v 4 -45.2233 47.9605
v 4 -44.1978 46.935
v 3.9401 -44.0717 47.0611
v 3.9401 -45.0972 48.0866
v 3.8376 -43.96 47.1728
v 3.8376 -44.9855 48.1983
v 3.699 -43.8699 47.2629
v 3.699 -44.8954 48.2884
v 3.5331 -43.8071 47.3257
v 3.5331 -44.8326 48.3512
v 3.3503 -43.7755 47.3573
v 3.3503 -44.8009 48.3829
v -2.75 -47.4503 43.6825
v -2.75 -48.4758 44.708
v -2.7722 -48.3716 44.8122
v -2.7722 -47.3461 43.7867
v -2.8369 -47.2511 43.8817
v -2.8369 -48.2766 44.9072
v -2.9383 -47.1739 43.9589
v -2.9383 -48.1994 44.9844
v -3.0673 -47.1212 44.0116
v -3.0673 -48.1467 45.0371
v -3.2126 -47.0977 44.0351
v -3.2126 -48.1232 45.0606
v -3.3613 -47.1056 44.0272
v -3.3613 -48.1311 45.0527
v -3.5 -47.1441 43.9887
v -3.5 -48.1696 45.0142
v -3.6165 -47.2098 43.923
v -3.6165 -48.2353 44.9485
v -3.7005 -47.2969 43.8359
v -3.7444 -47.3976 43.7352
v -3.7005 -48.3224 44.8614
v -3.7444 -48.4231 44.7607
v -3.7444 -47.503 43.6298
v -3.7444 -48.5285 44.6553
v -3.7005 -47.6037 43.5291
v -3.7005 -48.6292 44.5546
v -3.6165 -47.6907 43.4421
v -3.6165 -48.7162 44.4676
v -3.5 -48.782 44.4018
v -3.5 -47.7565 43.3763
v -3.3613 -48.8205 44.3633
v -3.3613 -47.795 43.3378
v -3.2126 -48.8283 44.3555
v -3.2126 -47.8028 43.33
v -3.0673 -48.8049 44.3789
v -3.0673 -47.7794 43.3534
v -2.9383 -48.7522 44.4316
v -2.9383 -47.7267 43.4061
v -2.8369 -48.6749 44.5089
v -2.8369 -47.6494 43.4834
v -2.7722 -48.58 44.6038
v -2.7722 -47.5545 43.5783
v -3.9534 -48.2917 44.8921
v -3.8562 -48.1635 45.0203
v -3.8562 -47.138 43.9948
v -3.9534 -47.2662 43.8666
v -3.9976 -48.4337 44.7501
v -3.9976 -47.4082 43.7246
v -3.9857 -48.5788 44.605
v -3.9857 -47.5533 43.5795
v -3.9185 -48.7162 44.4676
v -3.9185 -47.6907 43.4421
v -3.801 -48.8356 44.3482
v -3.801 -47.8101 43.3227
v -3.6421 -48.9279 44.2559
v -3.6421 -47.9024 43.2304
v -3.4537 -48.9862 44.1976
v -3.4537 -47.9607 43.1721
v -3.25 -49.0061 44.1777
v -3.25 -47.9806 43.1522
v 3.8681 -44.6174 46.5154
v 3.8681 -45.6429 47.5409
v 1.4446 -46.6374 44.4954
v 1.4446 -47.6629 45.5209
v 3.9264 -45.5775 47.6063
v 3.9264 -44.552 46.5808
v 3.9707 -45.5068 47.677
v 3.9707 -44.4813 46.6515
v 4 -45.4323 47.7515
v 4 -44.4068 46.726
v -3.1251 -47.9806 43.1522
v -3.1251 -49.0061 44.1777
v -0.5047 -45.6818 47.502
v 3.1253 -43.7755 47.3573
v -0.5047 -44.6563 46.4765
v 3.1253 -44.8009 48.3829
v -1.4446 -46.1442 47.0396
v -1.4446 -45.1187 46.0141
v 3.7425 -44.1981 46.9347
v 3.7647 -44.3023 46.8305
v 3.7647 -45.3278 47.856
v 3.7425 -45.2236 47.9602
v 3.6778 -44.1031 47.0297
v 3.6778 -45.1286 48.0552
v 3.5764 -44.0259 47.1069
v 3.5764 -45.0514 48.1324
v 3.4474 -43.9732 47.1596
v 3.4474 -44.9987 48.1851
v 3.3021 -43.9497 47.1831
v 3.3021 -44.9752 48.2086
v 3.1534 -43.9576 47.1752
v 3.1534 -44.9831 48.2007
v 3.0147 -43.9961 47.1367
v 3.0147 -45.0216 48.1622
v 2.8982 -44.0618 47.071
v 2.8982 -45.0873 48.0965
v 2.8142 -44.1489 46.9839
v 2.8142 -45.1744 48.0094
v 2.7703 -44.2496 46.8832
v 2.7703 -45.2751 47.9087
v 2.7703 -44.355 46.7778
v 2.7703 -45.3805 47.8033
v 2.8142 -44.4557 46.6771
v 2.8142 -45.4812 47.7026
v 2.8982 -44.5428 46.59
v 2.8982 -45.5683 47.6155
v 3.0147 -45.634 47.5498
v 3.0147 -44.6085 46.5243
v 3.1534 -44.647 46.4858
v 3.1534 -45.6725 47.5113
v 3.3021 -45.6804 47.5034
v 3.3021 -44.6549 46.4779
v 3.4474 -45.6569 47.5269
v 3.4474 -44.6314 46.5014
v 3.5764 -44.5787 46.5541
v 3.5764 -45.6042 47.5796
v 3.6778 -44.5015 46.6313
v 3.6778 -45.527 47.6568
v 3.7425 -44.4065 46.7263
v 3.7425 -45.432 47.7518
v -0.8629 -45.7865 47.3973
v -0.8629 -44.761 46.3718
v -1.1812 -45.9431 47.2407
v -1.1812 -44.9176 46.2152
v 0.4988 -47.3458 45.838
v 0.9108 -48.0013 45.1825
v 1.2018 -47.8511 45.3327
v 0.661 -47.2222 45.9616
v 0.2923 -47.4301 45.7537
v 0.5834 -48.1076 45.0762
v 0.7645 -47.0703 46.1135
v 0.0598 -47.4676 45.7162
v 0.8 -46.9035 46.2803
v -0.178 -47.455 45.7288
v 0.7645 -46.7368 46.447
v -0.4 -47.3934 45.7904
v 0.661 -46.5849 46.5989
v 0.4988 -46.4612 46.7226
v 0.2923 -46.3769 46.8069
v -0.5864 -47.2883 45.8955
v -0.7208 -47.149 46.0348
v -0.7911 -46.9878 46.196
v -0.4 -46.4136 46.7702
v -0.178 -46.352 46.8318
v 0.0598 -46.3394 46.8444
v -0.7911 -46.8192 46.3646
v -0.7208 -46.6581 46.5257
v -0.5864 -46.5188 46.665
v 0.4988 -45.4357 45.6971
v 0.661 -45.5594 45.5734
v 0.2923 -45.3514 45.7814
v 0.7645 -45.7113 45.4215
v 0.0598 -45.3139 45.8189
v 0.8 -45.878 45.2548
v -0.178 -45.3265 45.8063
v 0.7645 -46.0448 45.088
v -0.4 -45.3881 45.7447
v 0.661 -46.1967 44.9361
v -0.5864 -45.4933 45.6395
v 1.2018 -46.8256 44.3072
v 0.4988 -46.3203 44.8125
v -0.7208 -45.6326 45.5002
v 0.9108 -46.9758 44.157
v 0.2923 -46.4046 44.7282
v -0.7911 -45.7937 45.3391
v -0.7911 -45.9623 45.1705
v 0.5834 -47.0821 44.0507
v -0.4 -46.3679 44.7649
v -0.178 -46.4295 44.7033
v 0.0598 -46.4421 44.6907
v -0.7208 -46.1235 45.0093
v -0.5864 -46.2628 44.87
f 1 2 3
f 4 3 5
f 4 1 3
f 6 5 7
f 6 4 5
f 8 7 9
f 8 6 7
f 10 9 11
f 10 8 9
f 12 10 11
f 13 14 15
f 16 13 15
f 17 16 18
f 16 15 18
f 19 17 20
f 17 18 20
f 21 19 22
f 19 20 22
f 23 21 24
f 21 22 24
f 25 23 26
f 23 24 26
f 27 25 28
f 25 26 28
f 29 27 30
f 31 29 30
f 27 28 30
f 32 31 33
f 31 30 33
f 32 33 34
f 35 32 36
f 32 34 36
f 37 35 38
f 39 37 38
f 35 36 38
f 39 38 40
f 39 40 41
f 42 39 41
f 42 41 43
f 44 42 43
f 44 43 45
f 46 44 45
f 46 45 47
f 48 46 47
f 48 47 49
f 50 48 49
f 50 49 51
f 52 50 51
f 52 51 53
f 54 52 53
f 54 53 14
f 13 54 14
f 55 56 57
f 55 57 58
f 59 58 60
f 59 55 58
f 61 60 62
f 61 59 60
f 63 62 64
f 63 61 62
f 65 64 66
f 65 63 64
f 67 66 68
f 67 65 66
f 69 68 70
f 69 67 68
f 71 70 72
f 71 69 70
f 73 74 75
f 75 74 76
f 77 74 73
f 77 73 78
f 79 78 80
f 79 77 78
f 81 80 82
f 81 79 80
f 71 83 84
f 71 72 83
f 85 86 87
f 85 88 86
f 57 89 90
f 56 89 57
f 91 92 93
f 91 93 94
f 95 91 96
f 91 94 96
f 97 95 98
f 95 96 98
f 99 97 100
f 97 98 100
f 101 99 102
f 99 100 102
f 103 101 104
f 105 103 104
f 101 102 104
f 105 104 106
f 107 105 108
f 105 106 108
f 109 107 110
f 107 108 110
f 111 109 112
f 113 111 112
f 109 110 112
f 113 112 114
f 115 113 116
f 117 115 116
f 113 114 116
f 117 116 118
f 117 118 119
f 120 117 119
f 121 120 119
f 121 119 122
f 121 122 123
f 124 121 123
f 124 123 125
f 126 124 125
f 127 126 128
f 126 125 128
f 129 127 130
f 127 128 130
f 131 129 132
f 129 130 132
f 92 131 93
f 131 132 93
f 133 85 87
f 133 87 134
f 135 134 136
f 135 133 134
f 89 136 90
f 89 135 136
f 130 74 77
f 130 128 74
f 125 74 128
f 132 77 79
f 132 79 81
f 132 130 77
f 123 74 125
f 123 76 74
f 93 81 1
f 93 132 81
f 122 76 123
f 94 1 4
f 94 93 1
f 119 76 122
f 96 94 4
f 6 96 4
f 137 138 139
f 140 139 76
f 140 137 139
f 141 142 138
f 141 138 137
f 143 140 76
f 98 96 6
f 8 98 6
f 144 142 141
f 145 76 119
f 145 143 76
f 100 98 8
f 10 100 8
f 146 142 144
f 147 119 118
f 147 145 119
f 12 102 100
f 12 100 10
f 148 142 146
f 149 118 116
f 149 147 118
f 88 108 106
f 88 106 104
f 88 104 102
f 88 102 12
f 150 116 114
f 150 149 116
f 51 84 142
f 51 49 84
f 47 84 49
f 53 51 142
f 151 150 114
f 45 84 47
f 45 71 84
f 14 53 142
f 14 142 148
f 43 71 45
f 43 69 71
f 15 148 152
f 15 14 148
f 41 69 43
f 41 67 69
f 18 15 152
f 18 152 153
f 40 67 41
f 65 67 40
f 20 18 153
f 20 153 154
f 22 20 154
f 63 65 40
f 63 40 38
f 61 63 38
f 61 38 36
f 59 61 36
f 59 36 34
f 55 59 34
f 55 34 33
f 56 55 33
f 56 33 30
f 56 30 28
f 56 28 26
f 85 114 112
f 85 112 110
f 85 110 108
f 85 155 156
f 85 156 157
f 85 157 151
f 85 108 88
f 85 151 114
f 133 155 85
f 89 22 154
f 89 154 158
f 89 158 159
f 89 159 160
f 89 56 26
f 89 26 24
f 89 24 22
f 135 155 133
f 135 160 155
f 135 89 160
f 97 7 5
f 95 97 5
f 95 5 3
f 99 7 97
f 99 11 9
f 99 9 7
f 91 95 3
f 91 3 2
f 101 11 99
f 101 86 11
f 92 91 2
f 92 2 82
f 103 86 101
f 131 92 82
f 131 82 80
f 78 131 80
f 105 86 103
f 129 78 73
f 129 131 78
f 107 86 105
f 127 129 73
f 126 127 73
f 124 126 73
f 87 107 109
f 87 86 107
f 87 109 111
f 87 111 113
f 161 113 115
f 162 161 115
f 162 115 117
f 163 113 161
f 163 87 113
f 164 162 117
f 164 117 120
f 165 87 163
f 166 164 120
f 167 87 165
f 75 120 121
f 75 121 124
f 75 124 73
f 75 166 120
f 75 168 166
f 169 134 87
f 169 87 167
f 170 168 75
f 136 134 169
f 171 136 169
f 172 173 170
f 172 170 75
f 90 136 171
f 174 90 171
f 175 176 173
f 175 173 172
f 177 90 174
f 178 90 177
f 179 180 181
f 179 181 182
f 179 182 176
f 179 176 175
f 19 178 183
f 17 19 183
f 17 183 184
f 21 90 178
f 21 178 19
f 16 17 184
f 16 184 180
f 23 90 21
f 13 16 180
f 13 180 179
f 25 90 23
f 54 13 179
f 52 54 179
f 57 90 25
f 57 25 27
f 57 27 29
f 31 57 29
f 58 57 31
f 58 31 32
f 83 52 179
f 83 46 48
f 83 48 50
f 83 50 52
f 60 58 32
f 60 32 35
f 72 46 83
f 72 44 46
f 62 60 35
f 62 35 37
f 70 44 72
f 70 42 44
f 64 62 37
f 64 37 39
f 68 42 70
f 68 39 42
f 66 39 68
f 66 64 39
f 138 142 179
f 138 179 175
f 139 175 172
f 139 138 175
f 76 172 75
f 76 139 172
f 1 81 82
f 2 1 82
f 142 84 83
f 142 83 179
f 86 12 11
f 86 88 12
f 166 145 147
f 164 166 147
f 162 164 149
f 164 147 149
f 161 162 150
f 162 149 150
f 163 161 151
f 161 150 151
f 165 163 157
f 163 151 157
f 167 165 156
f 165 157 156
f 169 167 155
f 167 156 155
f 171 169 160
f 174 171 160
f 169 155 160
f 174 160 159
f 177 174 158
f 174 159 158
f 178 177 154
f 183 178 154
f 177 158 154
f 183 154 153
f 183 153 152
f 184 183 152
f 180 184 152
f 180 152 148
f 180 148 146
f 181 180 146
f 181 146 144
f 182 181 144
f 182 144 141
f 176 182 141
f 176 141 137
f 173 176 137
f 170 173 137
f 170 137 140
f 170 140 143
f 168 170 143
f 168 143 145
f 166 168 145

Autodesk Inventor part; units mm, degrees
ref_plane "YZ Plane" through (0, 0, 0) normal (1, 0, 0) x (0, 1, 0)
ref_plane "XZ Plane" through (0, 0, 0) normal (0, 1, 0) x (-1, 0, 0)
ref_plane "XY Plane" through (0, 0, 0) normal (0, 0, 1) x (1, 0, 0)
sketch "Sketch1" plane through (0, 0, 0) normal (1, 0, 0) x (0, 1, 0)
  circle A0 centre (-9.1612, 46.1081) radius 0.5 construction
  circle A1 centre (-9.1612, 46.1081) radius 0.9 construction
  line L0 (0, 43.0329) -> (-28.9151, 45.5627) construction
  line L1 (1.0918, 43.1767) -> (-27.4928, 38.1364) construction
  line L2 (-1.0918, 51.3262) -> (-28.367, 41.3989) construction
  line L3 (0, 51.4699) -> (-28.9151, 48.9402) construction
  line L4 (17.609, 51.9698) -> (-38.9081, 36.826) construction
  line L5 (18.2302, 47.2514) -> (-40.2807, 47.2514) construction
  line L6 (-2.4562, 42.2517) -> (-3.9425, 12.3724) construction
  line L7 (-19.1091, 33.3894) -> (19.1091, 33.3894) construction
  line L8 (-15.9499, 49.3393) -> (15.9499, 17.4395) construction
  line L9 (-15.9953, 17.3941) -> (15.9953, 49.3847) construction
  line L10 (2.4672, 42.2517) -> (3.9506, 12.3724) construction
  line L11 (-4.2099, 47.2514) -> (-6.25, 6.2414) construction
  line L12 (4.2215, 47.2514) -> (6.2448, 6.4952) construction
  circle A2 centre (-12.7187, 42.5506) radius 0.9 construction
  line L13 (-11.8457, 45.2351) -> (-10.9619, 46.119) construction
  line L14 (-10.9619, 46.119) -> (-9.1941, 44.3513) construction
  line L15 (-12.7296, 44.3513) -> (-13.501, 42.9956) construction
  line L16 (-11.8457, 45.2351) -> (-12.7296, 44.3513) construction
  line L17 (-10.9619, 42.5835) -> (-12.2433, 41.7864) construction
  line L18 (-12.7296, 44.3513) -> (-10.9619, 42.5835) construction
  line L19 (-10.9619, 46.119) -> (-9.6062, 46.8904) construction
  line L20 (-9.1941, 44.3513) -> (-10.078, 43.4674) construction
  line L21 (-10.9619, 42.5835) -> (-10.078, 43.4674) construction
  circle A3 centre (-12.7187, 42.5506) radius 0.5 construction
  line L22 (-13.4028, 41.8664) -> (-9.1612, 46.1081) construction
  line L23 (-9.1941, 44.3513) -> (-8.3969, 45.6327) construction
  line L24 (0.0006, 41.0008) -> (0, 41.0008) construction
  line L25 (0.0006, 41.0001) -> (0, 41.0001) construction
  line L26 (-2.4567, 42.2414) -> (2.4677, 42.2414) construction
  line L27 (2.4672, 42.2517) -> (-2.4562, 42.2517) construction
  line L28 (3, 47.2514) -> (4.2185, 47.2514) construction
  line L29 (0, 48.3894) -> (0, 48.3894) construction
  line L30 (-4.2185, 47.2514) -> (-4.2099, 47.2514) construction
  line L31 (0, 51.4699) -> (0, 43.0329) construction
  line L32 (-1.0918, 51.3262) -> (1.0918, 43.1767) construction
  ellipse E0 centre (0, 47.2514) end of major axis (-3, 47.2514) minor radius 3 (0.0225, 44.2515) -> (-0.0225, 44.2515) ccw construction
  circle A4 centre (0, 47.2514) radius 3 construction
  ellipse E1 centre (0, 47.2514) end of major axis (4.2185, 47.2514) minor radius 4.2127 (4.2185, 47.2514) -> (-4.2185, 47.2514) ccw construction
  circle A5 centre (0, 47.2514) radius 4.2185 construction
  line L33 (-6.0016, 11.2344) -> (6.0096, 11.2344) construction
  line L34 (-3.9425, 12.3724) -> (3.9506, 12.3724) construction
  ellipse E2 centre (0, 6.2414) end of major axis (-5, 6.2414) minor radius 5 construction
  ellipse E3 centre (0, 6.2414) end of major axis (6.25, 6.2414) minor radius 6.2414 (-6.2423, 6.5518) -> (6.2393, 6.6057) ccw construction
  line L35 (-28.1887, 40.7336) -> (-33.0183, 39.4395) construction
  line L36 (-34.1303, 30.7554) -> (-31, 33.8856) construction
  line L37 (-42.8892, 48.6033) -> (-22.6298, 28.3438) construction
  circle A6 centre (-31.7936, 38.7324) radius 0.2 construction
  circle A7 centre (-33.0183, 39.4395) radius 0.2 construction
  circle A8 centre (-32.7595, 38.4736) radius 0.6398 construction
  circle A9 centre (-32.7595, 38.4736) radius 0.6398 construction
  line L38 (-33.6434, 39.3574) -> (-31.8756, 37.5897) construction
  line L39 (-33.6434, 39.3574) -> (-31.5728, 39.3574) construction
  line L40 (-27.4928, 38.1364) -> (-28.367, 41.3989) construction
  line L41 (-28.9151, 45.5627) -> (-28.9151, 48.9402) construction
  line L42 (-34.0028, 47.2514) -> (-25.2783, 38.5269) construction
  line L43 (-28.1887, 40.7336) -> (-22.3931, 42.2865) construction
  line L44 (-21.5614, 39.1823) -> (-22.7073, 43.4588) construction
  line L45 (-27.6711, 38.8017) -> (-21.8755, 40.3546) construction
  line L46 (-32.5007, 37.5076) -> (-27.6711, 38.8017) construction
  line L47 (-42.7094, 48.4234) -> (-41.2248, 46.9389) construction
  line L48 (-33.0183, 39.4395) -> (-32.5007, 37.5076) construction
  circle A10 centre (-32.5007, 37.5076) radius 0.2 construction
  circle A11 centre (-32.7595, 38.4736) radius 1.01 construction
  circle A12 centre (-33.7254, 38.2147) radius 0.2 construction
  circle A13 centre (-32.7595, 38.4736) radius 1.25 construction
  line L49 (-31.8756, 37.5897) -> (-33.2898, 36.1755) construction
  line L50 (-31.8756, 37.5897) -> (-32.9109, 35.7965) construction
  line L51 (-35.0576, 37.9432) -> (-33.6434, 39.3574) construction
  line L52 (-32.9109, 35.7965) -> (-33.8666, 34.8408) construction
  line L53 (-33.2898, 36.1755) -> (-35.0576, 37.9432) construction
  line L54 (-35.4365, 38.3222) -> (-32.9109, 35.7965) construction
  line L55 (-36.3923, 37.3664) -> (-35.4365, 38.3222) construction
  line L56 (-33.8666, 34.8408) -> (-36.3923, 37.3664) construction
  line L57 (-31, 33.8856) -> (-41.6066, 44.4922) construction
  line L58 (-44.7369, 41.362) -> (-34.1303, 30.7554) construction
  line L59 (-43.1717, 42.9271) -> (-32.5651, 32.3205) construction
  line L60 (-33.6434, 39.3574) -> (-35.4365, 38.3222) construction
  circle A14 centre (-46.5116, 43.1367) radius 1.0497 construction
  line L61 (-47.1835, 40.9802) -> (-44.2042, 43.9595) construction
  line L62 (-46.1769, 46.993) -> (-47.2764, 45.8935) construction
  line L63 (-43.7409, 42.358) -> (-42.6414, 43.4574) construction
  line L64 (-43.1717, 42.9271) -> (-45.2366, 44.992) construction
  line L65 (-47.2764, 45.8935) -> (-43.7409, 42.358) construction
  line L66 (-45.8947, 42.269) -> (-42.5137, 45.6501) construction
  line L67 (-41.6066, 44.4922) -> (-44.7369, 41.362) construction
  line L68 (-48.6681, 42.4647) -> (-42.7094, 48.4234) construction
  line L69 (-41.9671, 47.6812) -> (-47.9258, 41.7225) construction
  line L70 (-41.2248, 46.9389) -> (-47.1835, 40.9802) construction
  line L71 (-42.6414, 43.4574) -> (-46.1769, 46.993) construction
  line L72 (-44.1236, 47.0092) -> (-42.6391, 45.5247) construction
  line L73 (-41.2248, 46.9389) -> (-44.2042, 43.9595) construction
  circle A15 centre (-43.3813, 46.2669) radius 1.0497 construction
  line L74 (-47.1835, 40.9802) -> (-48.6681, 42.4647) construction
  line L75 (-47.2538, 43.8789) -> (-45.7693, 42.3944) construction
  circle A16 centre (-43.3813, 46.2669) radius 1.0497 construction
  circle A17 centre (-46.5116, 43.1367) radius 1.05 construction
  circle A18 centre (-43.3813, 46.2669) radius 1.3 construction
  circle A19 centre (-46.5116, 43.1367) radius 1.3 construction
  line L76 (-41.9671, 47.6812) -> (-47.9258, 41.7225) construction
  line L77 (-47.9258, 41.7225) -> (-49.6936, 43.4902) construction
  line L78 (-49.6936, 43.4902) -> (-43.7349, 49.4489) construction
  line L79 (-43.7349, 49.4489) -> (-41.9671, 47.6812) construction
  line L80 (-41.9671, 47.6812) -> (-42.0968, 46.0669) construction
  line L81 (-47.9258, 41.7225) -> (-46.3116, 41.8522) construction
  line L82 (-44.9465, 44.7018) -> (-45.2271, 42.9367) construction
  line L83 (-44.9465, 44.7018) -> (-43.1813, 44.9824) construction
  line L84 (-44.801, 45.617) -> (-44.0639, 44.8421) construction
  line L85 (-44.0639, 44.8421) -> (-45.1697, 43.7902) construction
  line L86 (-45.1697, 43.7902) -> (-45.9068, 44.5651) construction
  line L87 (-45.9068, 44.5651) -> (-44.801, 45.617) construction
  line L88 (-44.801, 48.3828) -> (-49.0061, 44.1777) construction
  line L89 (-49.0061, 44.1777) -> (-52.5417, 47.7132) construction
  line L90 (-52.5417, 47.7132) -> (-48.3365, 51.9184) construction
  line L91 (-48.3365, 51.9184) -> (-44.801, 48.3828) construction
  line L92 (-46.9035, 50.4854) -> (-51.1087, 46.2803) construction
  line L93 (-44.801, 48.3828) -> (-43.7755, 47.3573)
  line L94 (-43.7755, 47.3573) -> (-47.9806, 43.1522)
  line L95 (-47.9806, 43.1522) -> (-49.0061, 44.1777)
  line L96 (-49.0061, 44.1777) -> (-44.801, 48.3828)
  line L97 (-46.1769, 46.993) -> (-45.1584, 45.9744)
  line L98 (-45.1584, 45.9744) -> (-46.2578, 44.875)
  line L99 (-46.2578, 44.875) -> (-47.2764, 45.8935)
  line L100 (-47.2764, 45.8935) -> (-46.1769, 46.993)
  point P0 (0, 0)
  point P1 (0, 0)
  point P2 (0, 33.3894)
  point P3 (-6.009, 41)
  point P4 (0, 47.2514)
  point P5 (0, 47.2514)
  point P6 (0, 0)
  point P7 (0, 0)
  point P8 (0, 12.3724)
  point P9 (0, 0)
  point P10 (28.7519, 36.3712)
  point P11 (-45.0774, 43.878)
  dimension "d12" = 3
  dimension "d13" = 5
  dimension "d14" = 6.2414
  dimension "d4" = 41.01
  dimension "d5" = 6.2414
  dimension "d6" = 4.993
  dimension "d7" = 5.69
  dimension "d8" = 29.869
  dimension "d9" = 1.138
  dimension "d10" = 2
  dimension "d11" = 90
  dimension "d15" = 15
  dimension "d16" = 2.5
  dimension "d17" = 1.25
  dimension "d18" = 60
  dimension "d19" = 2
  dimension "d20" = 1
  dimension "d21" = 6
  dimension "d22" = 1
  dimension "d23" = 1.8
  dimension "d24" = 5
  dimension "d25" = 2
  dimension "d26" = 2.02
  dimension "d27" = 2.5
  dimension "d28" = 0.4
  dimension "d29" = 360
  dimension "d30" = 150
  dimension "d31" = 15
  dimension "d32" = 15
  dimension "d33" = 5
  dimension "d34" = 0.75
  dimension "d35" = 4.2134
  dimension "d36" = 2
  dimension "d37" = 2.1
  dimension "d38" = 2.6
  dimension "d39" = 2.6
  dimension "d40" = 2.5
  dimension "d41" = 5
  dimension "d42" = 5.947
extrude "Extrusion1" add sketch "Sketch1" along normal mid plane 8
sketch "Sketch2" plane through (-4, -49.0061, 44.1777) normal (0, -0.7071068, 0.7071068) x (1, 0, 0)
  line L0 (0, 0) -> (8, 0) projected
  line L1 (8, 5.947) -> (8, 0) projected
  line L2 (8, 5.947) -> (0, 5.947) projected
  line L3 (0, 0) -> (0, 5.947) projected
  line L4 (0, 0) -> (8, 5.947)
  line L5 (0, 5.947) -> (0, 0) projected
  line L6 (0, 5.947) -> (8, 0)
  line L7 (0, 5.947) -> (8, 5.947) projected
  line L8 (4, 5.947) -> (4, -0.1076) construction
  line L9 (0, 2.9735) -> (8, 3) construction
  circle A0 centre (0.75, 0.75) radius 0.75
  circle A1 centre (4, 2.9735) radius 1.8
  line L10 (0.1438, 1.1916) -> (0.9981, 0.0422)
  circle A2 centre (0.7353, 5.2019) radius 0.75
  line L11 (0.1319, 4.7563) -> (0.9787, 5.9113)
  circle A3 centre (7.25, 0.75) radius 0.75
  line L12 (7.8562, 1.1916) -> (7.0019, 0.0422)
  line L13 (7.8681, 4.7563) -> (7.0213, 5.9113)
  circle A4 centre (7.2647, 5.2019) radius 0.75
  line L14 (2.6994, 4.2179) -> (0.1438, 1.1916)
  line L15 (0.8749, 0) -> (4.5834, 1.2707)
  line L16 (7.1253, 5.947) -> (3.4953, 4.7013)
  line L17 (7.8681, 4.7563) -> (5.295, 1.7233)
  line L18 (0, 5.947) -> (8, 5.947)
  line L19 (8, 5.947) -> (8, 0)
  line L20 (8, 0) -> (0, 0)
  line L21 (0, 0) -> (0, 5.947)
  circle A5 centre (4, 2.9735) radius 0.8
  circle A6 centre (0.75, 0.75) radius 0.5
  circle A7 centre (7.2647, 5.2019) radius 0.5
  point P0 (4, 3.4142)
  point P1 (8, 5.3499)
  point P2 (7.3505, 5.947)
  point P3 (8, 5.0539)
  point P4 (7.8027, 4.6793)
  point P5 (5.4446, 1.8996)
  point P6 (0, 0.75)
  point P7 (0.2132, 1.2737)
  point P8 (2.5554, 4.0474)
  point P9 (7.1253, 5.947)
  point P10 (0.75, 0)
  point P11 (4, 3)
  dimension "d45" = 1.5
  dimension "d46" = 3.6
  dimension "d49" = 1.6
  dimension "d52" = 1
  dimension "d53" = 1
extrude "Extrusion2" cut sketch "Sketch2" against normal through all contours L4 A0 L0 | L3 A0 L4 | L3 A2 L6 L14 A0 | L15 A1 L6 A3 L0 | L3 A2 L6 L11 | A3 L6 L0 | A3 L12 L6 | L3 L6 A2 | L11 L6 A2 | L6 A2 L2 L16 A1 | L6 A3 L1 | A3 L6 L12 | L6 L12 A3 | L2 A2 L6 | A2 L2 L11 L6 | L6 L11 A2 | A3 L6 L17 A4 L1 | A3 L12 L6 | A4 L4 L1 | L4 A4 L2
extrude "Extrusion3" cut sketch "Sketch2" against normal through all contours A5 L4 L6 | L6 L4 A5 | L4 L6 A5 | L4 A5 L6
extrude "Extrusion4" cut sketch "Sketch2" against normal through all contours A6 L10 L4 | L4 L10 A6 | A6 L4 L10 | L4 A6 L10 | A7 L4 L13 | L13 L4 A7 | A7 L4 L13 | L13 L4 A7
properties part number "clamp_mechanism" material "Steel, Mild"
